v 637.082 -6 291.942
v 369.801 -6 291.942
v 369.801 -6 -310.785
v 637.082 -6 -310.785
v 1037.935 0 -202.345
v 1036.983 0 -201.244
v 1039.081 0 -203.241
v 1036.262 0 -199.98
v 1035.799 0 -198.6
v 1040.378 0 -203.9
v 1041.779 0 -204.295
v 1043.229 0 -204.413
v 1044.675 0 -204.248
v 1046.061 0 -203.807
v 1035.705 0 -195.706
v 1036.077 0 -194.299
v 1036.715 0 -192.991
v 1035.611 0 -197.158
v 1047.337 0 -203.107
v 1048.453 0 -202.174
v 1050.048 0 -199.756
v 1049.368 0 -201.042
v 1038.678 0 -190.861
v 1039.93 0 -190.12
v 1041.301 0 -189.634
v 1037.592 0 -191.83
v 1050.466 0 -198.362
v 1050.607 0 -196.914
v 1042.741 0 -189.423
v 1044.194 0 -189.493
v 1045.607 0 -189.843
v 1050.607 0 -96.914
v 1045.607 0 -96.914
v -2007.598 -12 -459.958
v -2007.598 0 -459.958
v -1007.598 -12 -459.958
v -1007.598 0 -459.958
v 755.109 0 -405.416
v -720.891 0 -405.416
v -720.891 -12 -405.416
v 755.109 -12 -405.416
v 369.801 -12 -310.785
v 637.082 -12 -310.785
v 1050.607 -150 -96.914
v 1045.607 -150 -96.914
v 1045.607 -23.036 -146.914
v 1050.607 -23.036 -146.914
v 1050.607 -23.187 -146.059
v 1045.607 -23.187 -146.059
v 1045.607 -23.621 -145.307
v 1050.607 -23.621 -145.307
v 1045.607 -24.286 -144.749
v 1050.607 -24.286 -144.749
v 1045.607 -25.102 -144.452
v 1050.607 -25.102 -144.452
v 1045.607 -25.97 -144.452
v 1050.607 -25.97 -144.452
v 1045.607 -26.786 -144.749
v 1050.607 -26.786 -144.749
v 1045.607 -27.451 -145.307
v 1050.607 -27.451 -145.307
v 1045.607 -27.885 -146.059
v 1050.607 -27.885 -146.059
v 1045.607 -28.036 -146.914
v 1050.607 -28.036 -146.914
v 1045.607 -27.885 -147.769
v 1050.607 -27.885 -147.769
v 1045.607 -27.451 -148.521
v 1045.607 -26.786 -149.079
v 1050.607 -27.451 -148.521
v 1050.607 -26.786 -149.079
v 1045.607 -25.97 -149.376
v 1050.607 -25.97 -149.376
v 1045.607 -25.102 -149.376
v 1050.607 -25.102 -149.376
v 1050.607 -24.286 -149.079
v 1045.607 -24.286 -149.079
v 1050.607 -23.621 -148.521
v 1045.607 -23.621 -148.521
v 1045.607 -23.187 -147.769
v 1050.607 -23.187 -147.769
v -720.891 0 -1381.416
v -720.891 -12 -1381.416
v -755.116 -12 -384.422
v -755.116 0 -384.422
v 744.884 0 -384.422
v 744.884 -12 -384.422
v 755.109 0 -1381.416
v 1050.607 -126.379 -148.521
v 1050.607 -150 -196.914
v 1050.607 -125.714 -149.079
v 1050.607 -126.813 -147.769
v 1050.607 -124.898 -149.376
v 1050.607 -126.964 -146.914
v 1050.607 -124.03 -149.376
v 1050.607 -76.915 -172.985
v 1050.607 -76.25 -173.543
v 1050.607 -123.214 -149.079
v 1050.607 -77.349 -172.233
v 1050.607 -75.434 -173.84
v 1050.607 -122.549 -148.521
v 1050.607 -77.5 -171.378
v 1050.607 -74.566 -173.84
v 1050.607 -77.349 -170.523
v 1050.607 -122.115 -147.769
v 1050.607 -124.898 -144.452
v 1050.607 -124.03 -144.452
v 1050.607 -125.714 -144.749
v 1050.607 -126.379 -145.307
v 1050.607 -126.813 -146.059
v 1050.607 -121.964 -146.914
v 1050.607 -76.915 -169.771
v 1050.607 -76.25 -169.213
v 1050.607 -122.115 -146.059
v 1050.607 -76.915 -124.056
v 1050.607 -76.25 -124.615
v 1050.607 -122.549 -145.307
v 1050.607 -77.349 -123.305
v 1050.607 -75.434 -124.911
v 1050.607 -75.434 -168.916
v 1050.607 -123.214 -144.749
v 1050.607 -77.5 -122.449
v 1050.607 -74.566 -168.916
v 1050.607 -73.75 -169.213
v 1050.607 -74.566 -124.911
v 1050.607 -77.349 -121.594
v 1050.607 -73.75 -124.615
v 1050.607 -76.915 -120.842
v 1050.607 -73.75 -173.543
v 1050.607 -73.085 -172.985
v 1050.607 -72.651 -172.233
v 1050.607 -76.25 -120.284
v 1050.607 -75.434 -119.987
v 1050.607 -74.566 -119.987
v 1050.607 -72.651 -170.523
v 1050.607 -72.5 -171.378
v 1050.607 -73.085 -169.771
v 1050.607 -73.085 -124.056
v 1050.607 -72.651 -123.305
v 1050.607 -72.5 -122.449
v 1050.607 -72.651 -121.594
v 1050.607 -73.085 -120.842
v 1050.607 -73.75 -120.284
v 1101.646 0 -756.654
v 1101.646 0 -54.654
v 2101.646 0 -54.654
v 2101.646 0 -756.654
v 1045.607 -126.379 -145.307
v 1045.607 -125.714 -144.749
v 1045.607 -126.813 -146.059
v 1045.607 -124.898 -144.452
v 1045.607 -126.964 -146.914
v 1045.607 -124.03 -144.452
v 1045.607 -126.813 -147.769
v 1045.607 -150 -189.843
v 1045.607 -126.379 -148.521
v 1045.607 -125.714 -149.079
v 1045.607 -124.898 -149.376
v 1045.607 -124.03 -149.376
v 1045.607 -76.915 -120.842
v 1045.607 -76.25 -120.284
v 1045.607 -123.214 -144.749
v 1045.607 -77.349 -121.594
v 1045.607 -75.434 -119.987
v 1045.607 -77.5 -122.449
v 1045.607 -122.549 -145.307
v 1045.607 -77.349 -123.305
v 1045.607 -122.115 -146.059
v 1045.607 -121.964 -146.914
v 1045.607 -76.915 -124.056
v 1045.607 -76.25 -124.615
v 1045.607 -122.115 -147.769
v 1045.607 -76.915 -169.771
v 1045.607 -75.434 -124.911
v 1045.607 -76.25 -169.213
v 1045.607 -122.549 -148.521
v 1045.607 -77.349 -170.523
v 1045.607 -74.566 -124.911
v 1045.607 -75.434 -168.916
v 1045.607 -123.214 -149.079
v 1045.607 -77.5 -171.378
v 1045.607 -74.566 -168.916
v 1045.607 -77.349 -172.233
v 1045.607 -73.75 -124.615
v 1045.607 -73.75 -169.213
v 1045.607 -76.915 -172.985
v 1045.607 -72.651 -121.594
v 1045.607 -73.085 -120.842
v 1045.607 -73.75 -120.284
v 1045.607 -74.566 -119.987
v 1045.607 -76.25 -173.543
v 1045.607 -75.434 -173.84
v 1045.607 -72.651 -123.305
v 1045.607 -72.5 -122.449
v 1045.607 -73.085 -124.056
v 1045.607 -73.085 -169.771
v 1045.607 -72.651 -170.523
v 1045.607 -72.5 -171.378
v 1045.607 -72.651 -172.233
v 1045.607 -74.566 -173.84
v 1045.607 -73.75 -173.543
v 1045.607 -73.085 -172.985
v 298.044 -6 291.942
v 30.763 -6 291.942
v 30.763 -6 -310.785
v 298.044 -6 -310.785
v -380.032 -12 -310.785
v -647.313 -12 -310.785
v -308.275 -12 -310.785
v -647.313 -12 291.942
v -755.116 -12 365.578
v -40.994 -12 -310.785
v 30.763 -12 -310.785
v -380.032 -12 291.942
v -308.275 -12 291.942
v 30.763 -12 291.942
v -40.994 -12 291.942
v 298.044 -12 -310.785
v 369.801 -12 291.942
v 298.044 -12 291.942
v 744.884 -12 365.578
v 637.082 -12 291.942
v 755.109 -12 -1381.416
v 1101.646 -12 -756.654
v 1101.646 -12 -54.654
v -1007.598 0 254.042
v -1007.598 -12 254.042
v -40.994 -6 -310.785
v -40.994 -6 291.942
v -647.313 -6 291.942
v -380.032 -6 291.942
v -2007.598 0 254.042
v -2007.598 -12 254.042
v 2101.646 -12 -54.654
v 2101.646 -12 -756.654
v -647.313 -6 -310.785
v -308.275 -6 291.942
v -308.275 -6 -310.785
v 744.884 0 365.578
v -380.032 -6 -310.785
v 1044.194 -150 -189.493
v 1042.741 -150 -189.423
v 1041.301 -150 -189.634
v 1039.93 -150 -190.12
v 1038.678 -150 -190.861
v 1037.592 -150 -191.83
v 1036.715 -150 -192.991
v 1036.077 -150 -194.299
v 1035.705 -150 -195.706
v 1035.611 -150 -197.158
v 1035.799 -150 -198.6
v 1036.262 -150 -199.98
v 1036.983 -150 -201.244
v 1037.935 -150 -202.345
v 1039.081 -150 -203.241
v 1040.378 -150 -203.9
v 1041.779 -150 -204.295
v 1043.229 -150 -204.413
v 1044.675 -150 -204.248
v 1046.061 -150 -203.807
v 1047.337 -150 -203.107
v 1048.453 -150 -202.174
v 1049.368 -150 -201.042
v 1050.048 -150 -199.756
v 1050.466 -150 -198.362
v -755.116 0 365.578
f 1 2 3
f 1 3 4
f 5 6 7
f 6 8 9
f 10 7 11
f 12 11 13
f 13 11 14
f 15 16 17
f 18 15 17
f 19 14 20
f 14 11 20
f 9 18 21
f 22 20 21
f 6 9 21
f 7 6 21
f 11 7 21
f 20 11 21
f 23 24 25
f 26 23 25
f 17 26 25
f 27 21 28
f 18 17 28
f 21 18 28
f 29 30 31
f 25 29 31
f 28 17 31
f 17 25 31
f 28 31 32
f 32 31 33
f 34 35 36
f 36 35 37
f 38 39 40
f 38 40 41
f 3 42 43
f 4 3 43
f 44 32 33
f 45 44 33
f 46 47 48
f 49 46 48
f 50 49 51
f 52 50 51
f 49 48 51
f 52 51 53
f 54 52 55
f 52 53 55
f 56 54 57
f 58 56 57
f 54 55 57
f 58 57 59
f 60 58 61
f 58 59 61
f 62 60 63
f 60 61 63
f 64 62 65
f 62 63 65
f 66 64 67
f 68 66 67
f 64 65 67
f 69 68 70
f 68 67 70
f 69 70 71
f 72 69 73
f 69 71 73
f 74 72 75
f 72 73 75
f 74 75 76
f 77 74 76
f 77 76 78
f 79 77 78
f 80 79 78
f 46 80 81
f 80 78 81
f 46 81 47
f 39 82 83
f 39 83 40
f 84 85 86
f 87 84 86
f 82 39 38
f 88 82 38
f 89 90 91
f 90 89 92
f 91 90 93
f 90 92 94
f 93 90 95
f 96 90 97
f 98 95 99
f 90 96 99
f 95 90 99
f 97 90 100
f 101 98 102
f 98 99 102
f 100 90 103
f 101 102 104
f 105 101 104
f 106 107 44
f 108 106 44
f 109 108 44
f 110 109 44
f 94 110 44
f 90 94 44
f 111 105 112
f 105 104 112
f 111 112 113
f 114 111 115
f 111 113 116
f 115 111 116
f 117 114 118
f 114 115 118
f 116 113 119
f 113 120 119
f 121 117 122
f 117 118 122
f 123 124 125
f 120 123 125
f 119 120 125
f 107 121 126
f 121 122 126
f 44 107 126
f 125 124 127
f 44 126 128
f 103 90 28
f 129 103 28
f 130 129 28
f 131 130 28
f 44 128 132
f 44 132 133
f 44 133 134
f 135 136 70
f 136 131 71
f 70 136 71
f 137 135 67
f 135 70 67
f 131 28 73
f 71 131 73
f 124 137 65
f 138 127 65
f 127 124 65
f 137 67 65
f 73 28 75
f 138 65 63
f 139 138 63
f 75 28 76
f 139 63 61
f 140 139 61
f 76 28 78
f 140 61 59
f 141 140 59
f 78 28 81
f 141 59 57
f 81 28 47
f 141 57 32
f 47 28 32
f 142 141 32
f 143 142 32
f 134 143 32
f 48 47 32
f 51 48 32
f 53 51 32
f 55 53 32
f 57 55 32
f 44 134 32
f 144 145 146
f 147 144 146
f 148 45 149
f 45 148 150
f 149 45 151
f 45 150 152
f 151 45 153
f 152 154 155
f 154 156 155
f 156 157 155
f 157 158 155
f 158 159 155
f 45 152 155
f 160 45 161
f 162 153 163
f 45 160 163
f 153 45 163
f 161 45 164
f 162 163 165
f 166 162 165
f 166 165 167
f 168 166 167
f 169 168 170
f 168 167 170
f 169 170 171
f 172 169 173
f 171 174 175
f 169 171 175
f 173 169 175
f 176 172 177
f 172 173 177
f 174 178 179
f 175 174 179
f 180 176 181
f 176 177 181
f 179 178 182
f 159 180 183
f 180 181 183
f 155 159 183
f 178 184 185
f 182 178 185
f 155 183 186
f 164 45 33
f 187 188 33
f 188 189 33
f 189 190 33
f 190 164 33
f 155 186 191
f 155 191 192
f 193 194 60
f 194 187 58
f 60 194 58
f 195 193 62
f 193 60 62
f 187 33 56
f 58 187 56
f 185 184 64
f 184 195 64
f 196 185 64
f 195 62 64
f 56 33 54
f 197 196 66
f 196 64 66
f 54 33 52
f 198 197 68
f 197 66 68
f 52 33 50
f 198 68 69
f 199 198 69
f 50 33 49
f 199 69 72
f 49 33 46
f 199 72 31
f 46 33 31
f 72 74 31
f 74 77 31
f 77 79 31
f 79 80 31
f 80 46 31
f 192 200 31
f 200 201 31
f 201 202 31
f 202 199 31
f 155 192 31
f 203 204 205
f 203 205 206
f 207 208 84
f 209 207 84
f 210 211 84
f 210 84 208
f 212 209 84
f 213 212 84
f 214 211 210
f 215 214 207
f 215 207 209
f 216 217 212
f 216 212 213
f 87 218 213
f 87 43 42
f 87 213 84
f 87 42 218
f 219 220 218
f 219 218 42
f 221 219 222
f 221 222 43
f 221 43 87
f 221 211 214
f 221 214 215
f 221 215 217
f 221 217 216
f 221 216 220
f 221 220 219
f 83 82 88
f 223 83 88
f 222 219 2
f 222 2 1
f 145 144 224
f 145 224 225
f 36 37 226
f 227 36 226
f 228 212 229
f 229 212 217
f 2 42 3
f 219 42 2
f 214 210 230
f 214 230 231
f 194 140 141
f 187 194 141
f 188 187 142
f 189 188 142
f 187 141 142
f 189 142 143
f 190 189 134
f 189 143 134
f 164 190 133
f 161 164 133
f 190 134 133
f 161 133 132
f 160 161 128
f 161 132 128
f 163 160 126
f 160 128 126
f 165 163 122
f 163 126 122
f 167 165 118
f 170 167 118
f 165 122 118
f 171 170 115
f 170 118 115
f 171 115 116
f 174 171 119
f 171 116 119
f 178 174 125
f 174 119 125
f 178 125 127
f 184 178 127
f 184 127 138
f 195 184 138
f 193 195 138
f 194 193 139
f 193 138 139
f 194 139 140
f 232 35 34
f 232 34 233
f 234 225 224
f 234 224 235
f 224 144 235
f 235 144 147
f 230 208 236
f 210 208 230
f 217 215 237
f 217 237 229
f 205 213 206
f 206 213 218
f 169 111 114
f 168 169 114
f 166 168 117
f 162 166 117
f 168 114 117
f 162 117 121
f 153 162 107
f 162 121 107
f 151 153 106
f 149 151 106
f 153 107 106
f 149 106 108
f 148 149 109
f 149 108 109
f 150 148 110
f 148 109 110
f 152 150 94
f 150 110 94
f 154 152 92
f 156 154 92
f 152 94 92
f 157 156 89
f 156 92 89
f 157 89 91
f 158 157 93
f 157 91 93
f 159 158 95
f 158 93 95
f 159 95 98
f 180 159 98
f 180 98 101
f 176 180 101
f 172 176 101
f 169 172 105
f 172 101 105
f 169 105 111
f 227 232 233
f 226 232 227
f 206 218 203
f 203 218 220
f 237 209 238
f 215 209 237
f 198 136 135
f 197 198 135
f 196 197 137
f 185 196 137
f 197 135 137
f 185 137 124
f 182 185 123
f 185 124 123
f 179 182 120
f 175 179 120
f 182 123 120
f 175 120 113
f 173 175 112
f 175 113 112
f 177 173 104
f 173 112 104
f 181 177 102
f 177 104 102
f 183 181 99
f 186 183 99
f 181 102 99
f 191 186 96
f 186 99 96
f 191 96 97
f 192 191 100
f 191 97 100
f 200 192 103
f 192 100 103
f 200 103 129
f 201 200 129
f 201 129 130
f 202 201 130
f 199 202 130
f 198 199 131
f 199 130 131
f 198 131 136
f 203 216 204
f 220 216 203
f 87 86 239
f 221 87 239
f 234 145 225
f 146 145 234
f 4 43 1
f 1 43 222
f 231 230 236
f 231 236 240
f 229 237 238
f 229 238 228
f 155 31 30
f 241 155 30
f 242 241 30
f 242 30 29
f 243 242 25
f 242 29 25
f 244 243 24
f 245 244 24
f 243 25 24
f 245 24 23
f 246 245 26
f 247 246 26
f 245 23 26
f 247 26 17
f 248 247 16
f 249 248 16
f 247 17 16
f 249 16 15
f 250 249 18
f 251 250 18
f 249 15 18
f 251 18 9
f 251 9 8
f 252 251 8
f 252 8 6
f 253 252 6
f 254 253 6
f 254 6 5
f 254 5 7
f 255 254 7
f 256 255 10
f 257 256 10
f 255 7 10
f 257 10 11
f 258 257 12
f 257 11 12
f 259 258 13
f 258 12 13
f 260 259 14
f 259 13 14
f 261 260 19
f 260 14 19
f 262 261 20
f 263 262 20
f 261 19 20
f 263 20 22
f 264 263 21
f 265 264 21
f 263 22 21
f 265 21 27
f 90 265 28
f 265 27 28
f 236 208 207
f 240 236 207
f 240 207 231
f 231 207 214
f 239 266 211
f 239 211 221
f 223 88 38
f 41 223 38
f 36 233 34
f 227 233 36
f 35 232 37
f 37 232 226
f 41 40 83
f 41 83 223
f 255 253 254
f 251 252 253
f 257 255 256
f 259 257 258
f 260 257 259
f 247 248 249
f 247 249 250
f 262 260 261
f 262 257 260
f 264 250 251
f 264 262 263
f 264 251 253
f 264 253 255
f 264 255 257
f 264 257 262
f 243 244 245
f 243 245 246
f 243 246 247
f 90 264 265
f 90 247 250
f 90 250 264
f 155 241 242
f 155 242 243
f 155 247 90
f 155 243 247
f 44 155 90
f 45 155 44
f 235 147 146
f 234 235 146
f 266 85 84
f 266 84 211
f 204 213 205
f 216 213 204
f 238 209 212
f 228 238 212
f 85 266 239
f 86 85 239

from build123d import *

# Parameters (mm, degrees)
F1_W      = 1500
F1_H      = 750
F2_DEPTH  = 12
F3_W      = 267.2805812507
F3_H      = 602.7265457989
F4_DEPTH  = 6
F6_DEPTH  = 150
F7_R      = 2.5
F8_DEPTH  = 5
F9_W      = 1000
F9_H      = 714
F10_DEPTH = 12
F11_W     = 1000
F11_H     = 702
F12_DEPTH = 12
F13_W     = 1476
F13_H     = 976
F14_DEPTH = 12


with BuildPart() as f2:
    # F1 (on Front) → F2 (new body)
    with BuildSketch(Plane.XZ):
        with Locations((-5.1156505942, -9.4215959932)):
            Rectangle(F1_W, F1_H)
    extrude(amount=F2_DEPTH)

    # F3 (on face) → F4 (cut)
    with BuildSketch(Plane.XZ.offset(12)):
        with Locations((-513.6726281385, -9.4215959932)):
            Rectangle(F3_W, F3_H)
        with Locations((-174.634643109, -9.4215959932)):
            Rectangle(F3_W, F3_H)
        with Locations((164.4033419205, -9.4215959932)):
            Rectangle(F3_W, F3_H)
        with Locations((503.4413269501, -9.4215959932)):
            Rectangle(F3_W, F3_H)
    extrude(amount=-F4_DEPTH, mode=Mode.SUBTRACT)


with BuildPart() as f6:
    # F5 (on Front) → F6 (new body)
    with BuildSketch(Plane.XZ):
        with BuildLine():
            ThreePointArc((1045.6069111416, -189.8425437506), (1049.2306354986, -192.5834845435), (1050.6069111416, -196.9136115624))
            Line((1050.6069111416, -196.9136115624), (1050.6069111416, -96.9136115624))
            Line((1050.6069111416, -96.9136115624), (1045.6069111416, -96.9136115624))
            Line((1045.6069111416, -96.9136115624), (1045.6069111416, -189.8425437506))
        make_face()
        with BuildLine():
            ThreePointArc((1045.6069111416, -189.8425437506), (1036.9831867846, -201.2437385814), (1050.6069111416, -196.9136115624))
            ThreePointArc((1050.6069111416, -196.9136115624), (1049.2306354986, -192.5834845435), (1045.6069111416, -189.8425437506))
        make_face()
    extrude(amount=F6_DEPTH)

    # F7 (on face) → F8 (cut, through all)
    with BuildSketch(Plane.YZ.offset(1050.6069111416)):
        with Locations((-124.4641467929, -146.9136115624)):
            Circle(F7_R)
        with Locations((-75, -122.4494647696)):
            Circle(F7_R)
        with Locations((-75, -171.3777583553)):
            Circle(F7_R)
        with Locations((-25.5358532071, -146.9136115624)):
            Circle(F7_R)
    extrude(amount=-F8_DEPTH, mode=Mode.SUBTRACT)


with BuildPart() as f10:
    # F9 (on Front) → F10 (new body)
    with BuildSketch(Plane.XZ):
        with Locations((-1507.5983405113, -102.9583936978)):
            Rectangle(F9_W, F9_H)
    extrude(amount=F10_DEPTH)


with BuildPart() as f12:
    # F11 (on Front) → F12 (new body)
    with BuildSketch(Plane.XZ):
        with Locations((1601.6464829445, -405.6539972484)):
            Rectangle(F11_W, F11_H)
    extrude(amount=F12_DEPTH)


with BuildPart() as f14:
    # F13 (on Front) → F14 (new body)
    with BuildSketch(Plane.XZ):
        with Locations((17.1092748642, -893.4164781482)):
            Rectangle(F13_W, F13_H)
    extrude(amount=F14_DEPTH)


solid = Compound([f2.part, f6.part, f10.part, f12.part, f14.part])
